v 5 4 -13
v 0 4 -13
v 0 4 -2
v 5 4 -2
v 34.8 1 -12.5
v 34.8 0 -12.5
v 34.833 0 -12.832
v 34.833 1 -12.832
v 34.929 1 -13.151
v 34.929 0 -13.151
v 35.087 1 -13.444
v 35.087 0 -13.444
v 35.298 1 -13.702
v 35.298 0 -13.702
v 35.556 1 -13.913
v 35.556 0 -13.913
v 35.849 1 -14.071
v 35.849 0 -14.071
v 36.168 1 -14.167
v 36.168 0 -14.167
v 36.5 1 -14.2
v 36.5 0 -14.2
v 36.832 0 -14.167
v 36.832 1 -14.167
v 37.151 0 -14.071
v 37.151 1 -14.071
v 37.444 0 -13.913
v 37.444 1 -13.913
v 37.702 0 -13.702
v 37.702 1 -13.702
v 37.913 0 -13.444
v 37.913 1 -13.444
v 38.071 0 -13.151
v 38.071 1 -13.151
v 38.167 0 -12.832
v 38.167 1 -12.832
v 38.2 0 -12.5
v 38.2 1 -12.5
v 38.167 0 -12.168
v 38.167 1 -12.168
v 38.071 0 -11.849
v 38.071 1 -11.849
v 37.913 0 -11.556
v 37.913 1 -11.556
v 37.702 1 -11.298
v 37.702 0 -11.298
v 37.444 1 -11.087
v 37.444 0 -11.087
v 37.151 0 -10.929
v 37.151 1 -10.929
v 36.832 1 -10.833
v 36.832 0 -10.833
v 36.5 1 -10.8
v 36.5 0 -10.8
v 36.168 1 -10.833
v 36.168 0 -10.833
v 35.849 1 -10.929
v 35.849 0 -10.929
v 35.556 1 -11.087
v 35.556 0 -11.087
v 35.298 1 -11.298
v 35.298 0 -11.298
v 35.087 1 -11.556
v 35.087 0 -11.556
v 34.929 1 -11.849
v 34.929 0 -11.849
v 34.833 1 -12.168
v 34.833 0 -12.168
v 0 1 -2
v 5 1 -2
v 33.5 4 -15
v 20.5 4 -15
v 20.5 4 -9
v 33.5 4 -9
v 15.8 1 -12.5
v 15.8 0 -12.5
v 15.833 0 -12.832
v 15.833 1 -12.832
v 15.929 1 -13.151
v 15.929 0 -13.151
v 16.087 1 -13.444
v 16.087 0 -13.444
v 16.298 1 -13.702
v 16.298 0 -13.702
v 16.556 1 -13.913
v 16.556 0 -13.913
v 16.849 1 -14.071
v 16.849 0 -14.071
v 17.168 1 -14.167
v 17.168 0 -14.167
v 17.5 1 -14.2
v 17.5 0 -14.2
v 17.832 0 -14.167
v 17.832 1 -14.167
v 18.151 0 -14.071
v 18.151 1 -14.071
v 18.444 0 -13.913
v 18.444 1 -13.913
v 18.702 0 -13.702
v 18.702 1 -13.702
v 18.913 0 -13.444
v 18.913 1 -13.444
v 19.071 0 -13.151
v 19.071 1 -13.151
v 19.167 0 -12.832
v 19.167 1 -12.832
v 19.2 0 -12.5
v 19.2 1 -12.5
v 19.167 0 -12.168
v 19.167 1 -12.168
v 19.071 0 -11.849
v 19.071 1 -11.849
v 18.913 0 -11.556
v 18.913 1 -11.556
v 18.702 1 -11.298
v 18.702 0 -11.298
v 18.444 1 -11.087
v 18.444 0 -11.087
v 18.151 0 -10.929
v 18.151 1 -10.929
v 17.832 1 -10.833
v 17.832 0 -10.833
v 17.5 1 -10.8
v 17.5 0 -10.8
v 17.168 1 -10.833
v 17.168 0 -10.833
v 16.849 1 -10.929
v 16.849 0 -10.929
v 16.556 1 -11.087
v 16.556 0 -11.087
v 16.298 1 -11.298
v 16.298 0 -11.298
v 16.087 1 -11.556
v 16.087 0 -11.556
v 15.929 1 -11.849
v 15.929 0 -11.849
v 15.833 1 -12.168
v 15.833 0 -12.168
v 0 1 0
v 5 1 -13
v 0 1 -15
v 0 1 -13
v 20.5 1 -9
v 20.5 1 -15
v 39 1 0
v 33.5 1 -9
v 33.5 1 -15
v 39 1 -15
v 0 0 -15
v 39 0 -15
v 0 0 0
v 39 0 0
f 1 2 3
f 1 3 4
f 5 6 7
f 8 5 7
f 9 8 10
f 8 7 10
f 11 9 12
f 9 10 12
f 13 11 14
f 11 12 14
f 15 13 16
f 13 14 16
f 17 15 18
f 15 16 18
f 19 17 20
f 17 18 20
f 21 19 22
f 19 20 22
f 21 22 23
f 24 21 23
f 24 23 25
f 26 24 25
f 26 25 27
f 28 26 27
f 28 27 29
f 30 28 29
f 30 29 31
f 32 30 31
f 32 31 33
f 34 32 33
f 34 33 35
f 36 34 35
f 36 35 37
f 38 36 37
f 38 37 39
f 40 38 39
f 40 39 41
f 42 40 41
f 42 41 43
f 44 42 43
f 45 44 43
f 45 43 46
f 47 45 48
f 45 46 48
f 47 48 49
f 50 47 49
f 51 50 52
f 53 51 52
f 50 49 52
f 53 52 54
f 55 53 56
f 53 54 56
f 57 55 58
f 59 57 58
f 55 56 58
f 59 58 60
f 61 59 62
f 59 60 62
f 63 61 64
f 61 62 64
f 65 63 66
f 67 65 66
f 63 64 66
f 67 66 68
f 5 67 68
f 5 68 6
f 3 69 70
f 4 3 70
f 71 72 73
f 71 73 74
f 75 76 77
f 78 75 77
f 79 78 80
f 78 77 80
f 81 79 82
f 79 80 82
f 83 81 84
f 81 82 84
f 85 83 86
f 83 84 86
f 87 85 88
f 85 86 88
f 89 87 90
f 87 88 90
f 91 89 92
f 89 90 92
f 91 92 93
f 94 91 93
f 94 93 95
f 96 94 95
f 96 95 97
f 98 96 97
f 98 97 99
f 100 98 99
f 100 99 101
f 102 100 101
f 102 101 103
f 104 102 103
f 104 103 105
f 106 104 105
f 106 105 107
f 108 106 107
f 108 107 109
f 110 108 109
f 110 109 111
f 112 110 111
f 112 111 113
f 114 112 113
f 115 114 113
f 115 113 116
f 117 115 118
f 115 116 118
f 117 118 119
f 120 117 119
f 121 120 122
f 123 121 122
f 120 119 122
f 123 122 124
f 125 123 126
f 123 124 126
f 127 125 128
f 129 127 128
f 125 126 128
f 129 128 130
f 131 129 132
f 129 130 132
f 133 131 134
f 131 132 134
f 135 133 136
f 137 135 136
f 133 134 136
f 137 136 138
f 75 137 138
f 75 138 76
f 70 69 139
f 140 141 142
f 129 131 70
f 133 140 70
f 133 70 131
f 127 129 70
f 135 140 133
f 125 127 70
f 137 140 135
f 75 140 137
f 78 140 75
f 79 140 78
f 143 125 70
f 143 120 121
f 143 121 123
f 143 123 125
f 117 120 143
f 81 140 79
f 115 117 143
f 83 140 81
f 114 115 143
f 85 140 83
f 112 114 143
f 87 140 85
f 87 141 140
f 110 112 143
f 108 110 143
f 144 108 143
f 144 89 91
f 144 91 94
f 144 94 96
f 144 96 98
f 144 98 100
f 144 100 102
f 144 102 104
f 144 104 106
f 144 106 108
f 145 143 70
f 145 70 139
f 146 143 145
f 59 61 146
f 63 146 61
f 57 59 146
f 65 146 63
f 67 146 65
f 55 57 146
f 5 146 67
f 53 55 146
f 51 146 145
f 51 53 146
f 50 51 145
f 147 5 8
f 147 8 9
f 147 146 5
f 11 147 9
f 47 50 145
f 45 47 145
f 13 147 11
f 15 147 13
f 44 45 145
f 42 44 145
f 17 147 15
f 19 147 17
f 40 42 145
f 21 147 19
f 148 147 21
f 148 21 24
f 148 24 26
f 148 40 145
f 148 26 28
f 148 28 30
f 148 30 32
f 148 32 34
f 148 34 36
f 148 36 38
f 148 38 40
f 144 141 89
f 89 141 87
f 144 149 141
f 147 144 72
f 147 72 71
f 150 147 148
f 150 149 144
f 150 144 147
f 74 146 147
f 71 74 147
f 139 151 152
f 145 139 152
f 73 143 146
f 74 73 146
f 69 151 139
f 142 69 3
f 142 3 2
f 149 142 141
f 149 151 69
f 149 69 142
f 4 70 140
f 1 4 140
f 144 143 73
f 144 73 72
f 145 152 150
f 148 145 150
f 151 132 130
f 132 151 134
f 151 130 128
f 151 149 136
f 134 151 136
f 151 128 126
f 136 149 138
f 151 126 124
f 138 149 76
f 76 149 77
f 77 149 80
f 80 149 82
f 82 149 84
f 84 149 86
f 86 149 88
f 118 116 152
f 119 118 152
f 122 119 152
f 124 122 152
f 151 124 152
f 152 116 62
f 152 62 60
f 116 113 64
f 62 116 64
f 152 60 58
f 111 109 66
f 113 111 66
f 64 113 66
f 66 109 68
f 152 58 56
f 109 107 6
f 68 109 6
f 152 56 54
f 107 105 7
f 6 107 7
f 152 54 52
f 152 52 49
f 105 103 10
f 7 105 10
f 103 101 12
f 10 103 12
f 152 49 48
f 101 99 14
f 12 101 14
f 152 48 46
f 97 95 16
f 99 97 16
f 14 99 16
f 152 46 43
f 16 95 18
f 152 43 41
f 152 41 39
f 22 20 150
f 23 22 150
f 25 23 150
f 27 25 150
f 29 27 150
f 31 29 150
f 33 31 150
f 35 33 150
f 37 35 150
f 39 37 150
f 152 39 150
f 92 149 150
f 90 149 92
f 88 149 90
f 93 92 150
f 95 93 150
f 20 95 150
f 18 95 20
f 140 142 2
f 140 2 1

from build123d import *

# Parameters (mm, degrees)
SKETCH1_W            = 39
SKETCH1_H            = 15
BOSS_EXTRUDE1_DEPTH  = 1
M3_CLEARANCE_HOLE1_D = 3.4
SKETCH4_W            = 13
SKETCH4_H            = 6
BOSS_EXTRUDE2_DEPTH  = 3
SKETCH5_W            = 5
SKETCH5_H            = 11
BOSS_EXTRUDE3_DEPTH  = 3


with BuildPart() as part:
    # Sketch1 → Boss-Extrude1 (new body)
    with BuildSketch(Plane(origin=(0, 0, 0), x_dir=(1, 0, 0), z_dir=(0, 1, 0))):
        with Locations((19.5, 7.5)):
            Rectangle(SKETCH1_W, SKETCH1_H)
    extrude(amount=BOSS_EXTRUDE1_DEPTH)

    # M3 Clearance Hole1 (through all)
    with Locations(Plane(origin=(0, 1, 0), x_dir=(1, 0, 0), z_dir=(0, 1, 0))):
        with Locations((36.5, 12.5), (17.5, 12.5)):
            Hole(M3_CLEARANCE_HOLE1_D / 2)

    # Sketch4 → Boss-Extrude2 (add)
    with BuildSketch(Plane(origin=(0, 1, 0), x_dir=(1, 0, 0), z_dir=(0, 1, 0))):
        with Locations((27, 12)):
            Rectangle(SKETCH4_W, SKETCH4_H)
    extrude(amount=BOSS_EXTRUDE2_DEPTH)

    # Sketch5 → Boss-Extrude3 (add)
    with BuildSketch(Plane(origin=(0, 1, 0), x_dir=(1, 0, 0), z_dir=(0, 1, 0))):
        with Locations((2.5, 7.5)):
            Rectangle(SKETCH5_W, SKETCH5_H)
    extrude(amount=BOSS_EXTRUDE3_DEPTH)


solid = part.part
